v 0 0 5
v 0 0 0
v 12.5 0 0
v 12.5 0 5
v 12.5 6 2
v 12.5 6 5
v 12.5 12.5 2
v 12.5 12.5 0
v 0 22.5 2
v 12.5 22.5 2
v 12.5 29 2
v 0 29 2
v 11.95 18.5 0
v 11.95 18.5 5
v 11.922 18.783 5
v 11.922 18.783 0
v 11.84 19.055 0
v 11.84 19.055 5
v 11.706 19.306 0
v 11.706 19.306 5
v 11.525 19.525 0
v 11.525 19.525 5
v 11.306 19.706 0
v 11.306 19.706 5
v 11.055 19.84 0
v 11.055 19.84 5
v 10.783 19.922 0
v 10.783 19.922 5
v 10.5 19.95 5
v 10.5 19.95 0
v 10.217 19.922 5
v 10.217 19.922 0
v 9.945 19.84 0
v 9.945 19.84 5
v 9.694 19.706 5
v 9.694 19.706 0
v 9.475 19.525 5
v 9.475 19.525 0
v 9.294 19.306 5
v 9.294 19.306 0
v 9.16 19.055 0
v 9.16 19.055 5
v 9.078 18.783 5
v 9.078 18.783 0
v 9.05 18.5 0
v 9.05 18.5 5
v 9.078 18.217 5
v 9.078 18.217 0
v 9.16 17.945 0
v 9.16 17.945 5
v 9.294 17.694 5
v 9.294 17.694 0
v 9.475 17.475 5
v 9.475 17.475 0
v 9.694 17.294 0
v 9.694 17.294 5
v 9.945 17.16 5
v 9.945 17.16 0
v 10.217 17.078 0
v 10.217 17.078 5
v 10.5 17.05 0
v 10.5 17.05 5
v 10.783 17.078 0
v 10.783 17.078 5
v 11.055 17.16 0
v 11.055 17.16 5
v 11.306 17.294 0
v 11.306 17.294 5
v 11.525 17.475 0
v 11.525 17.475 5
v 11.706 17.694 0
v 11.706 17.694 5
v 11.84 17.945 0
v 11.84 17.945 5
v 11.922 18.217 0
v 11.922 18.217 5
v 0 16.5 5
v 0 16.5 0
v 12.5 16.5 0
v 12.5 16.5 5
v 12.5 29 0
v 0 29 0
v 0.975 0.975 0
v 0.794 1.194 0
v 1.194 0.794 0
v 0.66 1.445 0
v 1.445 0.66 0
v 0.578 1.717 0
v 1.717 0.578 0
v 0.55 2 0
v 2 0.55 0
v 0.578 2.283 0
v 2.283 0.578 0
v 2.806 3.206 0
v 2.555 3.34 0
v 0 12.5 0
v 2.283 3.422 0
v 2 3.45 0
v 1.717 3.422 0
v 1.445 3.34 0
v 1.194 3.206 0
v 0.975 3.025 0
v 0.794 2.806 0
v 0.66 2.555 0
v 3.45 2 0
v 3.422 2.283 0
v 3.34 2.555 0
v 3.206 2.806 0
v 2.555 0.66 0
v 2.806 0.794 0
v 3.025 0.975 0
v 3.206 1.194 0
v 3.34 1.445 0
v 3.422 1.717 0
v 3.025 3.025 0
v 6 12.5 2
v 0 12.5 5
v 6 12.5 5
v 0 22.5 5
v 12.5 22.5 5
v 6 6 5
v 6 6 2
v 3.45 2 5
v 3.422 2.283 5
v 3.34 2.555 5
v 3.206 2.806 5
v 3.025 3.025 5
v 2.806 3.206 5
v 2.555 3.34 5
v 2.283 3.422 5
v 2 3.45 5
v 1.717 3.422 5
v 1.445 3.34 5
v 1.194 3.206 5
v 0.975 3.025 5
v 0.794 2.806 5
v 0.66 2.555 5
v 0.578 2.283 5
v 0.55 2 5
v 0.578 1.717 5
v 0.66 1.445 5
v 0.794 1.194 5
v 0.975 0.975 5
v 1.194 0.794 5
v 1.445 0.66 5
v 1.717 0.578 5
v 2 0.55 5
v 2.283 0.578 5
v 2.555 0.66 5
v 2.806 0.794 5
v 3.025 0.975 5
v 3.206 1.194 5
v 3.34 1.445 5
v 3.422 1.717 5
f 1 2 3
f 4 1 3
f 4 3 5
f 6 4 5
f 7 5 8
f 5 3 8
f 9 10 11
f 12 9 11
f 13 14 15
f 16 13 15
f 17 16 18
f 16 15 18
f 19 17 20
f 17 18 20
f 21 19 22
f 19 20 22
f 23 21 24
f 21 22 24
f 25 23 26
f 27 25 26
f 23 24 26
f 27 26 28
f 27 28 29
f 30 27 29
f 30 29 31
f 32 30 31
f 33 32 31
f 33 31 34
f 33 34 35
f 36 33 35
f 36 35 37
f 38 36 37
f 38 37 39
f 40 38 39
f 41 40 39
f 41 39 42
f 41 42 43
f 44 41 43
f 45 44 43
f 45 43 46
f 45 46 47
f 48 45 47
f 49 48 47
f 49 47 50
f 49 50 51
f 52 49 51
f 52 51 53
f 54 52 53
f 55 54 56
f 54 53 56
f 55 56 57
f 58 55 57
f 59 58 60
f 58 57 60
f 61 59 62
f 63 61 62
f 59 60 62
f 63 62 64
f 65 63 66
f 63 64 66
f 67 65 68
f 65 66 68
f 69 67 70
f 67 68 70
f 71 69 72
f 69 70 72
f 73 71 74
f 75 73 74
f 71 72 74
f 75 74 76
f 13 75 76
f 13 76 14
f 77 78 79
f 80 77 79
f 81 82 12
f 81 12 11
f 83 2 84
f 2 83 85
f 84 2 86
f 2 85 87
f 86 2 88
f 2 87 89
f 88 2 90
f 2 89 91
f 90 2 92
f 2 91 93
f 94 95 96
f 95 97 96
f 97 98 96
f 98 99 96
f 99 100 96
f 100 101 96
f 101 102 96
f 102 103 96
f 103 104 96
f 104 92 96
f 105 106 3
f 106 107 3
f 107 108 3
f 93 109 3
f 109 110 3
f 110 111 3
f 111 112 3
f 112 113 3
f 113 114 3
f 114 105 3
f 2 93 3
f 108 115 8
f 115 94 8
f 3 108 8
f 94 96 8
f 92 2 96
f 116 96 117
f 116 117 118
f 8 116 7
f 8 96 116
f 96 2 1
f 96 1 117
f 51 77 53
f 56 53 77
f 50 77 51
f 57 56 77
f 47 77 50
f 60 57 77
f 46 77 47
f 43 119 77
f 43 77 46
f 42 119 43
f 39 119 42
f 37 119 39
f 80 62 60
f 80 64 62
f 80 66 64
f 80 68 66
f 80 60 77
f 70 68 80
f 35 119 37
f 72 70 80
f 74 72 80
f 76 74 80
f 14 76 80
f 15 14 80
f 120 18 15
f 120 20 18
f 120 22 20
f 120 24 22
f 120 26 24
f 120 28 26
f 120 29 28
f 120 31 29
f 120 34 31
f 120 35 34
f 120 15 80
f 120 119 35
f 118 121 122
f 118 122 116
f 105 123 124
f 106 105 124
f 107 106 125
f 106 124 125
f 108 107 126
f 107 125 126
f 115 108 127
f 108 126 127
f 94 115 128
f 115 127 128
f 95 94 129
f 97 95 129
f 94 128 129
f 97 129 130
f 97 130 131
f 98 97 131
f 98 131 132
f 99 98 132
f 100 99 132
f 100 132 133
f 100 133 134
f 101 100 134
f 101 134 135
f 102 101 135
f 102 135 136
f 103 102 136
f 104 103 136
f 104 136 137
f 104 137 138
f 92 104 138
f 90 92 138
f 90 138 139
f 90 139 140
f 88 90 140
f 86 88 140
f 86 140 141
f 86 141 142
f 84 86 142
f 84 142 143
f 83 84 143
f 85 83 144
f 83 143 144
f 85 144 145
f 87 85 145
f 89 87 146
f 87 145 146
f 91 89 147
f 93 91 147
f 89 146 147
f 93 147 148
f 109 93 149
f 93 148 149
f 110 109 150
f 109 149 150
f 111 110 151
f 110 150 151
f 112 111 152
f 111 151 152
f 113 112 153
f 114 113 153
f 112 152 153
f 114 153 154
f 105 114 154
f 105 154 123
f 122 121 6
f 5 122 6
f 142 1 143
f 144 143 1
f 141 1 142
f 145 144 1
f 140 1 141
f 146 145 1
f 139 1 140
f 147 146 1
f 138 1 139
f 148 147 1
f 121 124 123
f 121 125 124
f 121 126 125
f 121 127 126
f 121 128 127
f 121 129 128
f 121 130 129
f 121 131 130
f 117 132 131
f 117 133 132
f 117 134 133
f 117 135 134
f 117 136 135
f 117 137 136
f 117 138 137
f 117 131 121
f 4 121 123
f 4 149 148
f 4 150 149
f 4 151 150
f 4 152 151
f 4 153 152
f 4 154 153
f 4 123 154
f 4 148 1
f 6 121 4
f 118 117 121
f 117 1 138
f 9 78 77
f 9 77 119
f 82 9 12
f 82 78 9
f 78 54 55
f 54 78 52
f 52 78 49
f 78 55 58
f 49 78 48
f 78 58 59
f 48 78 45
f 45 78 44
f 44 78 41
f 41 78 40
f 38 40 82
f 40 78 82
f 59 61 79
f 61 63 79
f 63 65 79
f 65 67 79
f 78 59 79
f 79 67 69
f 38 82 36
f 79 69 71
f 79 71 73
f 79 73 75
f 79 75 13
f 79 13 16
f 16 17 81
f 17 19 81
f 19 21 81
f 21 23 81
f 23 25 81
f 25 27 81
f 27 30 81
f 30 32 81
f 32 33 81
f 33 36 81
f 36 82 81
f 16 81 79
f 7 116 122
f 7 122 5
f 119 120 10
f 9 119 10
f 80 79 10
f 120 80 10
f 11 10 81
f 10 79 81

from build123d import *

# Parameters (mm, degrees)
F0_W      = 12.5
F0_H      = 12.5
F1_DEPTH  = 5
F2_W      = 6.5
F2_H      = 6.5
F3_DEPTH  = 3
F4_R      = 1.45
F5_DEPTH  = 5.001
F7_DEPTH  = 6.001
F8_R      = 1.45
F9_DEPTH  = 5
F10_DEPTH = 5.001


with BuildPart() as f1:
    # F0 (on Top) → F1 (new body)
    with BuildSketch(Plane.XY):
        with Locations((6.25, 6.25)):
            Rectangle(F0_W, F0_H)
    extrude(amount=F1_DEPTH)

    # F2 (on face) → F3 (cut)
    with BuildSketch(Plane.XY.offset(5)):
        with Locations((9.25, 9.25)):
            Rectangle(F2_W, F2_H)
    extrude(amount=-F3_DEPTH, mode=Mode.SUBTRACT)

    # F4 (on face) → F5 (cut, through all)
    with BuildSketch(Plane.XY.offset(5)):
        with Locations((2, 2)):
            Circle(F4_R)
    extrude(amount=-F5_DEPTH, mode=Mode.SUBTRACT)


with BuildPart() as f6_1:
    # F6: copy of F1
    add(f1.part.moved(Location((0, 16.5, 0))))

    # F7 (cut, through all): a face of the model
    f7_faces = [f6_1.faces().sort_by_distance(p)[0] for p in [
        (6, 25.75, 3.5),
    ]]
    extrude(f7_faces, amount=-F7_DEPTH, mode=Mode.SUBTRACT)

    # F8 (on face) → F9 (join)
    with BuildSketch(Plane.XY.offset(5)):
        with Locations((2, 18.5)):
            Circle(F8_R)
    extrude(amount=-F9_DEPTH)

    # F8 (on face) → F10 (cut, through all)
    with BuildSketch(Plane.XY.offset(5)):
        with Locations((10.5, 18.5)):
            Circle(F8_R)
    extrude(amount=-F10_DEPTH, mode=Mode.SUBTRACT)


solid = Compound([f1.part, f6_1.part])
